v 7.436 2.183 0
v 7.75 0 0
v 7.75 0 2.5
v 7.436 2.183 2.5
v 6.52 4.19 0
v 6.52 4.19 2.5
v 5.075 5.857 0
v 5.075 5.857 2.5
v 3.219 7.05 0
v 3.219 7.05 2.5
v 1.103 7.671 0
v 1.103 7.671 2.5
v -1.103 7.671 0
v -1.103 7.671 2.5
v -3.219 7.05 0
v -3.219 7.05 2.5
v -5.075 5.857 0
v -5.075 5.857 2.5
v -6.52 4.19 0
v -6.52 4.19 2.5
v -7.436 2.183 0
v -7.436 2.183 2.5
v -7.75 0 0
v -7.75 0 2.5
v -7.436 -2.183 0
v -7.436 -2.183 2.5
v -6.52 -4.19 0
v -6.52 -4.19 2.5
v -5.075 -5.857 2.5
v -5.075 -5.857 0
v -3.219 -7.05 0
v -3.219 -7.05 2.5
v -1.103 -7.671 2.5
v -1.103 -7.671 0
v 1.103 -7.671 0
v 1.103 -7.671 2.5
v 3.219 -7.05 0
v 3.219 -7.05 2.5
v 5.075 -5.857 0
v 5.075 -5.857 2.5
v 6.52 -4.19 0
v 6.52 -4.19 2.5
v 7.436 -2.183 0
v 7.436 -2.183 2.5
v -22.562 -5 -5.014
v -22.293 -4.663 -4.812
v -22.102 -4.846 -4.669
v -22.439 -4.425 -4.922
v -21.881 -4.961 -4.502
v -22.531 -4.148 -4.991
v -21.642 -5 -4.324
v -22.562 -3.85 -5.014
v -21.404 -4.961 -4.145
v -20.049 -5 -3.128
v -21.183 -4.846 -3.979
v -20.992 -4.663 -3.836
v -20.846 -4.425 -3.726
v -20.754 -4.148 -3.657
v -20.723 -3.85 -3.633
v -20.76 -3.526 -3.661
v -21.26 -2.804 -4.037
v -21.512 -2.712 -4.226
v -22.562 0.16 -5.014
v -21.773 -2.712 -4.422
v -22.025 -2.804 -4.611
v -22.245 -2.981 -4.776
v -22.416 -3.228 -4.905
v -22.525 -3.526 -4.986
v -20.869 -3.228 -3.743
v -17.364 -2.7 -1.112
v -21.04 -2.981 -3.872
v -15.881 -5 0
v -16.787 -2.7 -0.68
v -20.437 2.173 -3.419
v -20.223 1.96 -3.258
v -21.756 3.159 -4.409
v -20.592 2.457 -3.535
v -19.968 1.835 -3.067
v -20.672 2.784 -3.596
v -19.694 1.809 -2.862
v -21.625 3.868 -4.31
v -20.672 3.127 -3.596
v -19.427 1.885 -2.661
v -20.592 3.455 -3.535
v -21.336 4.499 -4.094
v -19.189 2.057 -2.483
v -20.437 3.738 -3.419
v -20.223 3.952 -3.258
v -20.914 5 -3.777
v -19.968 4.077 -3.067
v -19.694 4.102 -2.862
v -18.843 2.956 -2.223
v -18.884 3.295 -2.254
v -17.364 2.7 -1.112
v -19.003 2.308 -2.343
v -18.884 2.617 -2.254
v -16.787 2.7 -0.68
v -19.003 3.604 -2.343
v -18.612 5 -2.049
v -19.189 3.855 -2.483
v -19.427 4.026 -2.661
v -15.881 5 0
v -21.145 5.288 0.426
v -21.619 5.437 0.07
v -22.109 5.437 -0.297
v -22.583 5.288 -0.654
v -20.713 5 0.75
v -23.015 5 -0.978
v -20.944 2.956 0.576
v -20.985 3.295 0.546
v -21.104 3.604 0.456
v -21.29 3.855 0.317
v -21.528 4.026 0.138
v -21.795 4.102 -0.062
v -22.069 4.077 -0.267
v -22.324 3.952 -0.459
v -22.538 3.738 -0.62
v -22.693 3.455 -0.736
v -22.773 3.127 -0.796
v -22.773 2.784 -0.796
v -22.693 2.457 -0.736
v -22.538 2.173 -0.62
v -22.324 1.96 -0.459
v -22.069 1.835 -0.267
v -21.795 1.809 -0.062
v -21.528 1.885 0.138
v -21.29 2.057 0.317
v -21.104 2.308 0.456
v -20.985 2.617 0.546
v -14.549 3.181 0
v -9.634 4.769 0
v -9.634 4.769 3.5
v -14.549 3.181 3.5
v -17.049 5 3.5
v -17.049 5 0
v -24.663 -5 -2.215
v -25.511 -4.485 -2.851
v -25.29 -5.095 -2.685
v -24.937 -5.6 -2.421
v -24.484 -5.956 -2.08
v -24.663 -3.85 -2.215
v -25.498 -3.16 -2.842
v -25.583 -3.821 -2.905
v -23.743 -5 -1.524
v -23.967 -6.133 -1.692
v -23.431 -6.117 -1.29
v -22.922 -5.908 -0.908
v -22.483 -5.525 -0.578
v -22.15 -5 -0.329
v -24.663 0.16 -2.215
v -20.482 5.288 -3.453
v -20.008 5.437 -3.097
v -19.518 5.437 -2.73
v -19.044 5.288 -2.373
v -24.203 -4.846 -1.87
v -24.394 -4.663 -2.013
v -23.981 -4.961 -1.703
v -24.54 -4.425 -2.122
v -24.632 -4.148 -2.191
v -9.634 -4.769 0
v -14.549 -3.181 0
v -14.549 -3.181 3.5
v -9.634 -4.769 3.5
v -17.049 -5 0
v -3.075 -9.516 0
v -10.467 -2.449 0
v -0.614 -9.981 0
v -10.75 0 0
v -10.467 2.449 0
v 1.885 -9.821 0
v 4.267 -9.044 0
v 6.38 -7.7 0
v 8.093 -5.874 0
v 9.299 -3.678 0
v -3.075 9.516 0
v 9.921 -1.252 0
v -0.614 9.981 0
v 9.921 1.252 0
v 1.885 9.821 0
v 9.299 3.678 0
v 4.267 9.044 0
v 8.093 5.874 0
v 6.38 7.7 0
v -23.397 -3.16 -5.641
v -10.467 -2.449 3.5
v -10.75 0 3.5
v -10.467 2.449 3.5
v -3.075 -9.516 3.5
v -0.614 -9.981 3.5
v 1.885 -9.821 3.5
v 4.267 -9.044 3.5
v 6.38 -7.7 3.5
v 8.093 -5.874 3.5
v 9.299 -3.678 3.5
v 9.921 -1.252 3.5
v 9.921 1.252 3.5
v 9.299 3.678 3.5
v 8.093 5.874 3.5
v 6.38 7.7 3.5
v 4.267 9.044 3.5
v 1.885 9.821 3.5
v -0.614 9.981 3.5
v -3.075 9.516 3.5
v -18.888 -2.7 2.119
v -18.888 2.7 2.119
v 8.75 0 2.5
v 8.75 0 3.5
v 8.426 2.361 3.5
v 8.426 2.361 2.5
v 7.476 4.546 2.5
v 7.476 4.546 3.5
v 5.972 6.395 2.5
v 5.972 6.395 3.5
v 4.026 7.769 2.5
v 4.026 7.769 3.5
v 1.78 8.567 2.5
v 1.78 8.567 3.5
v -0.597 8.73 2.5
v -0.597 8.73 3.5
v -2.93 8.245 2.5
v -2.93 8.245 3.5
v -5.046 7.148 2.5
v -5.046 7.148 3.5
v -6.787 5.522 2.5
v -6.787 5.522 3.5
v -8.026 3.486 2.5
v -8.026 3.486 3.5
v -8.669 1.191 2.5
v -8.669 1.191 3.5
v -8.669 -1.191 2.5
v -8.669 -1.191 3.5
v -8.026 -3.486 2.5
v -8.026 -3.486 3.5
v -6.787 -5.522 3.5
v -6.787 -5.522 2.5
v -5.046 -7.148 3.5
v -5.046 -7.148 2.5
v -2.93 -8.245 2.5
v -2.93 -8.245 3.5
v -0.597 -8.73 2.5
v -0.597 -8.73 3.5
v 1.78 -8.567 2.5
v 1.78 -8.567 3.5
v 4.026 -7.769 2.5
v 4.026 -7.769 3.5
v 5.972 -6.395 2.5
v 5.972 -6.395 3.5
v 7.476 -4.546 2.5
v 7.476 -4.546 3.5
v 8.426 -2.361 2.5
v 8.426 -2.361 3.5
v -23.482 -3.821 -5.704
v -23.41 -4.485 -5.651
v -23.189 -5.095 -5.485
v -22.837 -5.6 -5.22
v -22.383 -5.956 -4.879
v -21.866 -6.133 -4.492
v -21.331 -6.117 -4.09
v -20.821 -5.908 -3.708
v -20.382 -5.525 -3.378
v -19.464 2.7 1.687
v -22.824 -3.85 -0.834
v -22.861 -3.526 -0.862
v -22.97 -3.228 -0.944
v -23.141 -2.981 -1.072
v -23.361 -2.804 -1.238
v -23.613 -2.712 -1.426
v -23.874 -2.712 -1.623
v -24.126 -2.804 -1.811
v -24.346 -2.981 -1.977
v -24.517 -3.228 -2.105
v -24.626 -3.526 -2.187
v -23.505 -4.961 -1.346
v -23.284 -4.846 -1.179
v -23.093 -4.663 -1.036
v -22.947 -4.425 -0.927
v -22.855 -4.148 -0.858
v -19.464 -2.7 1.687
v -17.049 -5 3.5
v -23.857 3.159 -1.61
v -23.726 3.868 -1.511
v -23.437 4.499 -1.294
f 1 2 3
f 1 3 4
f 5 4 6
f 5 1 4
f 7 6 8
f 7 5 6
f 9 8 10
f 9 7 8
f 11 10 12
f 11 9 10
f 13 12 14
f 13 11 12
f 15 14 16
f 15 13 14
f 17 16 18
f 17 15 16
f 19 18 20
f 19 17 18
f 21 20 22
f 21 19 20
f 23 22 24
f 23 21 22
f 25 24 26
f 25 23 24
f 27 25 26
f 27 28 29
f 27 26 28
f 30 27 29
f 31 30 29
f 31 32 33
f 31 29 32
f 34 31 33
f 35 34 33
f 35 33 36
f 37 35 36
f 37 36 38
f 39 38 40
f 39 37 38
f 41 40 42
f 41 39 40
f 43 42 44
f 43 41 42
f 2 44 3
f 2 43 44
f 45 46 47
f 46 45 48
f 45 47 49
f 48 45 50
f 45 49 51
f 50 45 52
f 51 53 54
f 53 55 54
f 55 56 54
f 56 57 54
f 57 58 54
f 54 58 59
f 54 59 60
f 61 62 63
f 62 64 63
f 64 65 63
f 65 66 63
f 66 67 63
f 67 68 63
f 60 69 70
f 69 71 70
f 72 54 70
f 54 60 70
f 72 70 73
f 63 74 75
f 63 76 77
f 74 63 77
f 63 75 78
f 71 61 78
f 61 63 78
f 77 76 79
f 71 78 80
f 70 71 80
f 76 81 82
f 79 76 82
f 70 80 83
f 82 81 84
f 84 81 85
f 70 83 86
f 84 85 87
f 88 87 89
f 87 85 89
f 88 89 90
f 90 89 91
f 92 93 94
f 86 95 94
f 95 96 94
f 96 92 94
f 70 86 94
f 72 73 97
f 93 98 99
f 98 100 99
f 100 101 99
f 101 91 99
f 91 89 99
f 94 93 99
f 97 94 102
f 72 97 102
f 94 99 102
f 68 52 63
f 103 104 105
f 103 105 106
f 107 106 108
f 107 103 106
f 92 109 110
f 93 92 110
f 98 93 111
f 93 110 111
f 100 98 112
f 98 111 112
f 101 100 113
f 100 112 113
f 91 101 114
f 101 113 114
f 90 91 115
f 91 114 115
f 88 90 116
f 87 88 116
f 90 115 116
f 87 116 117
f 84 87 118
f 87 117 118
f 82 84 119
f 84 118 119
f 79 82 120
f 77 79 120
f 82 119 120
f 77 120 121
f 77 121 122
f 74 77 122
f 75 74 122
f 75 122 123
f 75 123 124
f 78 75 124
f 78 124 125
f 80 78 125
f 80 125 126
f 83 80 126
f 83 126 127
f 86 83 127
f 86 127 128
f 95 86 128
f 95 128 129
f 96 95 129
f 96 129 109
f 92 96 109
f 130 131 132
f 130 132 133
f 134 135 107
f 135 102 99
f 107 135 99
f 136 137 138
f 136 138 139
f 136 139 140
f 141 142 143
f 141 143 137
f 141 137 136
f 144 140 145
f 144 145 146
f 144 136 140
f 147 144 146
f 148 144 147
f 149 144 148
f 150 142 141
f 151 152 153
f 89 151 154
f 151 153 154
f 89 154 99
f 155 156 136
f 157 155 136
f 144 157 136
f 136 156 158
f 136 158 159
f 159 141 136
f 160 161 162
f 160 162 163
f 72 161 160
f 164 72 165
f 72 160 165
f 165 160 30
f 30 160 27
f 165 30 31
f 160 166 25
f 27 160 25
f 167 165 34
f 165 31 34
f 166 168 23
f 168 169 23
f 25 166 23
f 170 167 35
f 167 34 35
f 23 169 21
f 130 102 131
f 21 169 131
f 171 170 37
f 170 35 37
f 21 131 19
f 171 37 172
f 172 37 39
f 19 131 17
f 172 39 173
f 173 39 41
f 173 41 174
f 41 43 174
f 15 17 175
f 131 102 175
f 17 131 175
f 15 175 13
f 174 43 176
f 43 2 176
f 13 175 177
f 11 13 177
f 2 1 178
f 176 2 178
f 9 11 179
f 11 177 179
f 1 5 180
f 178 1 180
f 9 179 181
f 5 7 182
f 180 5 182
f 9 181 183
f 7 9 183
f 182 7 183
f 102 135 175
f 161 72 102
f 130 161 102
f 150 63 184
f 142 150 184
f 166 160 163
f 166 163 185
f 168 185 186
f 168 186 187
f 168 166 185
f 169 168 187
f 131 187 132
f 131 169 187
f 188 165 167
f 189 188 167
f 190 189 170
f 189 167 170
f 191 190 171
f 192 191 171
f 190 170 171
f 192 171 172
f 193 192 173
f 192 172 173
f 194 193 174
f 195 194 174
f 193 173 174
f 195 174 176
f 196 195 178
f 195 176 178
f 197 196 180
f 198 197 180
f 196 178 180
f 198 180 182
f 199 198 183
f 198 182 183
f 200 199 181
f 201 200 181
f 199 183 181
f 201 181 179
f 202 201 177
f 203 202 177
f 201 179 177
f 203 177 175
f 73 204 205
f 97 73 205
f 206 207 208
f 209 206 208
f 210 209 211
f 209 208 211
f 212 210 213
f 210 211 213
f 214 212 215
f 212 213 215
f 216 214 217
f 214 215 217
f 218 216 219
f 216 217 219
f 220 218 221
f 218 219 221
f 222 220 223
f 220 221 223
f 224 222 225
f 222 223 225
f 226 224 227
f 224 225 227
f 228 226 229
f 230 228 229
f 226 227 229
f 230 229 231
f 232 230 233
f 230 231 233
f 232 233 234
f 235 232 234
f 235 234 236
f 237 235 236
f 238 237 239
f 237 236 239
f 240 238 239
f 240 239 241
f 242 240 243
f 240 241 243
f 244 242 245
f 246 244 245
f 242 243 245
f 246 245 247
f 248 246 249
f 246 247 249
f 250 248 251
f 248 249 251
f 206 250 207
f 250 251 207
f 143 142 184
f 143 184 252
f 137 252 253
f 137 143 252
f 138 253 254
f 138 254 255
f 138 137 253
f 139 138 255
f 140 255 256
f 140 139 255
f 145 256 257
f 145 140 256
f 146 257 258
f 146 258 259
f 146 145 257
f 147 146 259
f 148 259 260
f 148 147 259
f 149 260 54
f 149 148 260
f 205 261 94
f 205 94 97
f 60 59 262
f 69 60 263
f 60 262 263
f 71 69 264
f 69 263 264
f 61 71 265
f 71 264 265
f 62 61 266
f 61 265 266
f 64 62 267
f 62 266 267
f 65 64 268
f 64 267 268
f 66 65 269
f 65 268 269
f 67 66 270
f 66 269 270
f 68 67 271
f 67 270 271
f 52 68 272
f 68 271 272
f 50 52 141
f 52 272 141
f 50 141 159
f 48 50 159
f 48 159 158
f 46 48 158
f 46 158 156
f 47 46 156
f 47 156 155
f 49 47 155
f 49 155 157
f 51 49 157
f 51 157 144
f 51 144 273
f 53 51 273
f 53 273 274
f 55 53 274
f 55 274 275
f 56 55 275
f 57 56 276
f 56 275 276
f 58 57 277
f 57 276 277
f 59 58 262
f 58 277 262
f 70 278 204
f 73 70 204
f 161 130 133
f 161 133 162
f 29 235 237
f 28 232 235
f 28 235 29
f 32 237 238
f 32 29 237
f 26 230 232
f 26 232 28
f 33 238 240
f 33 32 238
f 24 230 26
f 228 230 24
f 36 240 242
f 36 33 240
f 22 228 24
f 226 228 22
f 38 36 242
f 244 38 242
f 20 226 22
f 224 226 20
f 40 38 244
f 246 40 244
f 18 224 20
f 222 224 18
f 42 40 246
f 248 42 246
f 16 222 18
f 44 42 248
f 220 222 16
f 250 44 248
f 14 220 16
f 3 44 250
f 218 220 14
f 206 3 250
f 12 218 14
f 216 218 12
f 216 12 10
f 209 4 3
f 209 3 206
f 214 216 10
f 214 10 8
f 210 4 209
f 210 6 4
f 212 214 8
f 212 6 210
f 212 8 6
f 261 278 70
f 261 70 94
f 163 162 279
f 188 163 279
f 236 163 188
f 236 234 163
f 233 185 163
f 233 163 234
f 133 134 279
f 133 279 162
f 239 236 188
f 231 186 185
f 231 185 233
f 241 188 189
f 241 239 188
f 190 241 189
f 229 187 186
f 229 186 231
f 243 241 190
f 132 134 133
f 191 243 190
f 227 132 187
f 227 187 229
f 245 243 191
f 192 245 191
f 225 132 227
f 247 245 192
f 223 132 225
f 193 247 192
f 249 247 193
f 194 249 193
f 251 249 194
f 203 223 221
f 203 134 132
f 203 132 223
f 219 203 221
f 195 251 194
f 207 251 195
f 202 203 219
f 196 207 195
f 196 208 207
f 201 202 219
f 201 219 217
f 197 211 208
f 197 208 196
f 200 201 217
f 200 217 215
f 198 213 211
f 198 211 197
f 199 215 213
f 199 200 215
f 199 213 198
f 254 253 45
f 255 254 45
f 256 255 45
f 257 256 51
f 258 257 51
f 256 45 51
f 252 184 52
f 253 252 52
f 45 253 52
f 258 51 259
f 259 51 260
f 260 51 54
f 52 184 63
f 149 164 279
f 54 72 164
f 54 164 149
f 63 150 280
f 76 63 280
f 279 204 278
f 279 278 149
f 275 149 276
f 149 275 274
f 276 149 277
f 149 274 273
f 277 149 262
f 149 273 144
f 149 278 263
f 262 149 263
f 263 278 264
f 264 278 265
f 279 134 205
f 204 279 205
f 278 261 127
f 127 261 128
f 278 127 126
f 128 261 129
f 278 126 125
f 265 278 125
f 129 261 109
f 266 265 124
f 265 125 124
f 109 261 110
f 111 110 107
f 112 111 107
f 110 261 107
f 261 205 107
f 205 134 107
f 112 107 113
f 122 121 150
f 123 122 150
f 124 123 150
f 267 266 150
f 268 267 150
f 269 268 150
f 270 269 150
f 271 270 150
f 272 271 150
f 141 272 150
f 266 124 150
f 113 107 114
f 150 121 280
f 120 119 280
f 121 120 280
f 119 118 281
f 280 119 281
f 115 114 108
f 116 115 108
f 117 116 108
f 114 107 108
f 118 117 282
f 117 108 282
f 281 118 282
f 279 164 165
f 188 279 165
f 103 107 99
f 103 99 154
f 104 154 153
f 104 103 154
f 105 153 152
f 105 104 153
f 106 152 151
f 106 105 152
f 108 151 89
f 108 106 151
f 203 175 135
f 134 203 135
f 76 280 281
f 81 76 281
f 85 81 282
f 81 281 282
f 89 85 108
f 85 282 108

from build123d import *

# Parameters (mm, degrees)
SKETCH_1_R           = 7.75
EXTRUDE_1_DEPTH      = 3.5
SKETCH_2_R           = 8.75
CUT_EXTRUDE_1_DEPTH  = 1
EXTRUDE_2_DEPTH      = 5
SKETCH_8_W           = 0.720416832
SKETCH_8_H           = 5.4
CUT_EXTRUDE_6_DEPTH  = 26.612556655
EXTRUDE_6_DEPTH      = 3.5
SKETCH_4_9_R         = 1.15
CUT_EXTRUDE_9_DEPTH  = 27.034467236
CUT_EXTRUDE_10_DEPTH = 3.5


with BuildPart() as part:
    # 草图1 → 凸台-拉伸1 (new body)
    with BuildSketch(Plane.XY):
        with BuildLine():
            Line((-3.074847287, 9.515530157), (-17.048765133, 5))
            Line((-17.048765133, 5), (-17.048765133, -5))
            Line((-17.048765133, -5), (-3.074847287, -9.515530157))
            ThreePointArc((-3.074847287, -9.515530157), (10, 0), (-3.074847287, 9.515530157))
        make_face()
        Circle(SKETCH_1_R, mode=Mode.SUBTRACT)
        with BuildLine():
            Line((-14.548765133, 3.180565718), (-14.548765133, -3.180565718))
            Line((-14.548765133, -3.180565718), (-9.63448381, -4.768566002))
            ThreePointArc((-9.63448381, -4.768566002), (-10.75, 0), (-9.63448381, 4.768566002))
            Line((-9.63448381, 4.768566002), (-14.548765133, 3.180565718))
        make_face(mode=Mode.SUBTRACT)
    extrude(amount=EXTRUDE_1_DEPTH)

    # 草图2 → 切除-拉伸1 (cut)
    with BuildSketch(Plane.XY.offset(3.5)):
        Circle(SKETCH_2_R)
    extrude(amount=-CUT_EXTRUDE_1_DEPTH, mode=Mode.SUBTRACT)

    # 草图3 → 凸台-拉伸2 (add, symmetric)
    with BuildSketch(Plane(origin=(0, 0, 0), x_dir=(1, 0, 0), z_dir=(0, 1, 0))):
        Polygon((-17.048765133, -3.5), (-24.66318775, 2.214797011), (-22.562251427, 5.014094523), (-15.881448124, 0), align=None)
    extrude(amount=EXTRUDE_2_DEPTH, both=True)

    # 草图8 → 切除-拉伸6 (cut, through all)
    with BuildSketch(Plane(origin=(-7.82335713, 0, 10.423878111), x_dir=(0.7997992893547787, 0, 0.6002675209834286), z_dir=(-0.6002675209834286, 0, 0.7997992893547787))):
        with Locations((-14.194862331, 0)):
            Rectangle(SKETCH_8_W, SKETCH_8_H)
    extrude(amount=-CUT_EXTRUDE_6_DEPTH, mode=Mode.SUBTRACT)

    # 草图4 → 凸台-拉伸6 (add)
    with BuildSketch(Plane(origin=(-7.82335713, 0, 10.423878111), x_dir=(0.7997992893547787, 0, 0.6002675209834286), z_dir=(-0.6002675209834286, 0, 0.7997992893547787))):
        with BuildLine():
            Line((-19.939913719, 3.705712142), (-22.099126281, -3.159985282))
            ThreePointArc((-22.099126281, -3.159985282), (-20.830616239, -5.955555875), (-17.913212318, -5))
            Line((-17.913212318, -5), (-17.348837919, 1.241173708))
            Line((-17.348837919, 1.241173708), (-16.116035743, 2.269506831))
            Line((-16.116035743, 2.269506831), (-16.116035743, 5))
            ThreePointArc((-16.116035743, 5), (-18.356590206, 5.323726244), (-19.939913719, 3.705712142))
        make_face()
    extrude(amount=-EXTRUDE_6_DEPTH)

    # 草图4<9> → 切除-拉伸9 (cut, through all)
    with BuildSketch(Plane(origin=(-7.82335713, 0, 10.423878111), x_dir=(0.7997992893547787, 0, 0.6002675209834286), z_dir=(-0.6002675209834286, 0, 0.7997992893547787))):
        with Locations((-17.555070747, 2.955696144)):
            Circle(SKETCH_4_9_R)
        with Locations((-19.905070747, -3.85)):
            Circle(SKETCH_4_9_R)
    extrude(amount=-CUT_EXTRUDE_9_DEPTH, mode=Mode.SUBTRACT)

    # 草图9 → 切除-拉伸10 (cut)
    with BuildSketch(Plane(origin=(-7.82335713, 0, 10.423878111), x_dir=(0.7997992893547787, 0, 0.6002675209834286), z_dir=(-0.6002675209834286, 0, 0.7997992893547787))):
        with BuildLine():
            Line((-21.055070747, 0.15982191), (-20.046766168, 3.15929852))
            ThreePointArc((-20.046766168, 3.15929852), (-19.725256431, 4.196781997), (-18.994105751, 5))
            Line((-18.994105751, 5), (-18.994105751, 5.471830363))
            Line((-18.994105751, 5.471830363), (-21.906262893, 5.471830363))
            Line((-21.906262893, 5.471830363), (-21.906262893, 0.15982191))
            Line((-21.906262893, 0.15982191), (-21.055070747, 0.15982191))
        make_face()
    extrude(amount=-CUT_EXTRUDE_10_DEPTH, mode=Mode.SUBTRACT)


solid = part.part
